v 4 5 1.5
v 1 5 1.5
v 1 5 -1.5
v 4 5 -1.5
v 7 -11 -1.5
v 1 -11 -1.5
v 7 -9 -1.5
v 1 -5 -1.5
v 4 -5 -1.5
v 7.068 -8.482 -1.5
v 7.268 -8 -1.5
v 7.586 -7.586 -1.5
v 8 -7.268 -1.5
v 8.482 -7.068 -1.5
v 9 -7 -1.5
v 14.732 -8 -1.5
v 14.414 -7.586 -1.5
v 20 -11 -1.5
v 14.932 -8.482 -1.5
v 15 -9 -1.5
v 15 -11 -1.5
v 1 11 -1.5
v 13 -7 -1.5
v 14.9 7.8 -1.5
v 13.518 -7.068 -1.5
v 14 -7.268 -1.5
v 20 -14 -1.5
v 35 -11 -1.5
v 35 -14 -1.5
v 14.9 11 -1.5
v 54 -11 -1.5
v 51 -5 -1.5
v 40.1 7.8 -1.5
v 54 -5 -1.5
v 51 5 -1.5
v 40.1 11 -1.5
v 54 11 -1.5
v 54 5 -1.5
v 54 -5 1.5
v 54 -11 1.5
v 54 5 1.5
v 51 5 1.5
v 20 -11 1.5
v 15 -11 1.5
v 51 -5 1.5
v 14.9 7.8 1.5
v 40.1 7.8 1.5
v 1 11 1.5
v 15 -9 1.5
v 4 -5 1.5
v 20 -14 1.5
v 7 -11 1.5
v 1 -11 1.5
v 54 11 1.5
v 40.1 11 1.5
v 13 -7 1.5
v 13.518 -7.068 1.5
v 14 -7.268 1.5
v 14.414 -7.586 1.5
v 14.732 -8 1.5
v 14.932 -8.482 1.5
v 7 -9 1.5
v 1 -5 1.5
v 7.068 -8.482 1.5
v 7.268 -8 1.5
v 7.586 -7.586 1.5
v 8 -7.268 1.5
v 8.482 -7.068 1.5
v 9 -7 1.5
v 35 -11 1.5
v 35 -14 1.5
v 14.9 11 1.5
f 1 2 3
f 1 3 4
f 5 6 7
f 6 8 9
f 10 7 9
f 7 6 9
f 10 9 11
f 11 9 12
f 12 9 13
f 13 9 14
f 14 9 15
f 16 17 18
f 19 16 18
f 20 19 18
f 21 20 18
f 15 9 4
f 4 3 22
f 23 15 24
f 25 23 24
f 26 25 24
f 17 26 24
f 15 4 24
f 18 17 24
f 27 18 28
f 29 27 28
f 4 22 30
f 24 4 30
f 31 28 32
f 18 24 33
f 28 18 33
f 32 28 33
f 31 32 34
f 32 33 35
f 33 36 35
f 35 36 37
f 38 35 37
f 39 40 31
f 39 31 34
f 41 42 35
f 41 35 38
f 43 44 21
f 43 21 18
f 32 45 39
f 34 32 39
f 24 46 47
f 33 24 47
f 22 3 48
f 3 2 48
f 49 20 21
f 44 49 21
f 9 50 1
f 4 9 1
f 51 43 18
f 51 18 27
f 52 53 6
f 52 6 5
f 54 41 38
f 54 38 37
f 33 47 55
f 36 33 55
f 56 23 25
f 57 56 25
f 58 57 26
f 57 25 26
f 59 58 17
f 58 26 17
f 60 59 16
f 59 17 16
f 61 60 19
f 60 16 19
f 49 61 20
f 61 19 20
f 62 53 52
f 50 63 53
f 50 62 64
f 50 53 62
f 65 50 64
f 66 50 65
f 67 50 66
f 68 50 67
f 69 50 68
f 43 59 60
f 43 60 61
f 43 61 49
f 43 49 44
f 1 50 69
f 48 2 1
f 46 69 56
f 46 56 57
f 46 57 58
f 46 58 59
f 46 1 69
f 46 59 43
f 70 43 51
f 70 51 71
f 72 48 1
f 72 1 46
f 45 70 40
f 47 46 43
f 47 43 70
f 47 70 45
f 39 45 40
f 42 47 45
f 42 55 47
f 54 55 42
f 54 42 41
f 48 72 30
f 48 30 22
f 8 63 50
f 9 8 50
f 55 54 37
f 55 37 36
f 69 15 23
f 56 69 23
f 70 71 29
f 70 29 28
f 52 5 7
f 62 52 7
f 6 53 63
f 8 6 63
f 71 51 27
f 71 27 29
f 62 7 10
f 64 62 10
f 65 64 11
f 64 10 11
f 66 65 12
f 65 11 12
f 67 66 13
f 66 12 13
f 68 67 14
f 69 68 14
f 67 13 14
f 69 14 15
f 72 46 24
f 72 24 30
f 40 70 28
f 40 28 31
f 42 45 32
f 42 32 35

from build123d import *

# Parameters (mm, degrees)
BOSS_EXTRUDE1_DEPTH = 1.5
SKETCH2_W           = 3
SKETCH2_H           = 10
CUT_EXTRUDE1_DEPTH  = 56.865910894
SKETCH3_W           = 55
SKETCH3_H           = 25
CUT_EXTRUDE2_DEPTH  = 56.865910894
CUT_EXTRUDE3_DEPTH  = 56.865910894
SKETCH7_W           = 25.2
SKETCH7_H           = 3.2
CUT_EXTRUDE6_DEPTH  = 56.865910894


with BuildPart() as part:
    # Sketch1 → Boss-Extrude1 (new, symmetric)
    with BuildSketch(Plane.XY):
        Polygon((-20, -11), (20, -11), (20, -14), (35, -14), (35, -11), (54, -11), (54, 11), (-54, 11), (-54, -11), (-35, -11), (-35, -14), (-20, -14), align=None)
    extrude(amount=BOSS_EXTRUDE1_DEPTH, both=True)

    # Sketch2 → Cut-Extrude1 (cut, through all)
    with BuildSketch(Plane.XY.offset(1.5)):
        with Locations((2.5, 0)):
            Rectangle(SKETCH2_W, SKETCH2_H)
        with Locations((52.5, 0)):
            Rectangle(SKETCH2_W, SKETCH2_H)
    extrude(amount=-CUT_EXTRUDE1_DEPTH, mode=Mode.SUBTRACT)

    # Sketch3 → Cut-Extrude2 (cut, through all)
    with BuildSketch(Plane.XY.offset(1.5)):
        with Locations((-26.5, -1.5)):
            Rectangle(SKETCH3_W, SKETCH3_H)
    extrude(amount=-CUT_EXTRUDE2_DEPTH, mode=Mode.SUBTRACT)

    # Sketch4 → Cut-Extrude3 (cut, through all)
    with BuildSketch(Plane(origin=(0, 0, -1.5), x_dir=(-1, 0, 0), z_dir=(0, 0, -1))):
        with BuildLine():
            Line((-7, -11), (-7, -9))
            ThreePointArc((-7, -9), (-7.585786438, -7.585786438), (-9, -7))
            Line((-9, -7), (-13, -7))
            ThreePointArc((-13, -7), (-14.414213562, -7.585786438), (-15, -9))
            Line((-15, -9), (-15, -11))
            Line((-15, -11), (-7, -11))
        make_face()
    extrude(amount=-CUT_EXTRUDE3_DEPTH, mode=Mode.SUBTRACT)

    # Sketch7 → Cut-Extrude6 (cut, through all)
    with BuildSketch(Plane.XY.offset(1.5)):
        with Locations((27.5, 9.4)):
            Rectangle(SKETCH7_W, SKETCH7_H)
    extrude(amount=-CUT_EXTRUDE6_DEPTH, mode=Mode.SUBTRACT)


solid = part.part
